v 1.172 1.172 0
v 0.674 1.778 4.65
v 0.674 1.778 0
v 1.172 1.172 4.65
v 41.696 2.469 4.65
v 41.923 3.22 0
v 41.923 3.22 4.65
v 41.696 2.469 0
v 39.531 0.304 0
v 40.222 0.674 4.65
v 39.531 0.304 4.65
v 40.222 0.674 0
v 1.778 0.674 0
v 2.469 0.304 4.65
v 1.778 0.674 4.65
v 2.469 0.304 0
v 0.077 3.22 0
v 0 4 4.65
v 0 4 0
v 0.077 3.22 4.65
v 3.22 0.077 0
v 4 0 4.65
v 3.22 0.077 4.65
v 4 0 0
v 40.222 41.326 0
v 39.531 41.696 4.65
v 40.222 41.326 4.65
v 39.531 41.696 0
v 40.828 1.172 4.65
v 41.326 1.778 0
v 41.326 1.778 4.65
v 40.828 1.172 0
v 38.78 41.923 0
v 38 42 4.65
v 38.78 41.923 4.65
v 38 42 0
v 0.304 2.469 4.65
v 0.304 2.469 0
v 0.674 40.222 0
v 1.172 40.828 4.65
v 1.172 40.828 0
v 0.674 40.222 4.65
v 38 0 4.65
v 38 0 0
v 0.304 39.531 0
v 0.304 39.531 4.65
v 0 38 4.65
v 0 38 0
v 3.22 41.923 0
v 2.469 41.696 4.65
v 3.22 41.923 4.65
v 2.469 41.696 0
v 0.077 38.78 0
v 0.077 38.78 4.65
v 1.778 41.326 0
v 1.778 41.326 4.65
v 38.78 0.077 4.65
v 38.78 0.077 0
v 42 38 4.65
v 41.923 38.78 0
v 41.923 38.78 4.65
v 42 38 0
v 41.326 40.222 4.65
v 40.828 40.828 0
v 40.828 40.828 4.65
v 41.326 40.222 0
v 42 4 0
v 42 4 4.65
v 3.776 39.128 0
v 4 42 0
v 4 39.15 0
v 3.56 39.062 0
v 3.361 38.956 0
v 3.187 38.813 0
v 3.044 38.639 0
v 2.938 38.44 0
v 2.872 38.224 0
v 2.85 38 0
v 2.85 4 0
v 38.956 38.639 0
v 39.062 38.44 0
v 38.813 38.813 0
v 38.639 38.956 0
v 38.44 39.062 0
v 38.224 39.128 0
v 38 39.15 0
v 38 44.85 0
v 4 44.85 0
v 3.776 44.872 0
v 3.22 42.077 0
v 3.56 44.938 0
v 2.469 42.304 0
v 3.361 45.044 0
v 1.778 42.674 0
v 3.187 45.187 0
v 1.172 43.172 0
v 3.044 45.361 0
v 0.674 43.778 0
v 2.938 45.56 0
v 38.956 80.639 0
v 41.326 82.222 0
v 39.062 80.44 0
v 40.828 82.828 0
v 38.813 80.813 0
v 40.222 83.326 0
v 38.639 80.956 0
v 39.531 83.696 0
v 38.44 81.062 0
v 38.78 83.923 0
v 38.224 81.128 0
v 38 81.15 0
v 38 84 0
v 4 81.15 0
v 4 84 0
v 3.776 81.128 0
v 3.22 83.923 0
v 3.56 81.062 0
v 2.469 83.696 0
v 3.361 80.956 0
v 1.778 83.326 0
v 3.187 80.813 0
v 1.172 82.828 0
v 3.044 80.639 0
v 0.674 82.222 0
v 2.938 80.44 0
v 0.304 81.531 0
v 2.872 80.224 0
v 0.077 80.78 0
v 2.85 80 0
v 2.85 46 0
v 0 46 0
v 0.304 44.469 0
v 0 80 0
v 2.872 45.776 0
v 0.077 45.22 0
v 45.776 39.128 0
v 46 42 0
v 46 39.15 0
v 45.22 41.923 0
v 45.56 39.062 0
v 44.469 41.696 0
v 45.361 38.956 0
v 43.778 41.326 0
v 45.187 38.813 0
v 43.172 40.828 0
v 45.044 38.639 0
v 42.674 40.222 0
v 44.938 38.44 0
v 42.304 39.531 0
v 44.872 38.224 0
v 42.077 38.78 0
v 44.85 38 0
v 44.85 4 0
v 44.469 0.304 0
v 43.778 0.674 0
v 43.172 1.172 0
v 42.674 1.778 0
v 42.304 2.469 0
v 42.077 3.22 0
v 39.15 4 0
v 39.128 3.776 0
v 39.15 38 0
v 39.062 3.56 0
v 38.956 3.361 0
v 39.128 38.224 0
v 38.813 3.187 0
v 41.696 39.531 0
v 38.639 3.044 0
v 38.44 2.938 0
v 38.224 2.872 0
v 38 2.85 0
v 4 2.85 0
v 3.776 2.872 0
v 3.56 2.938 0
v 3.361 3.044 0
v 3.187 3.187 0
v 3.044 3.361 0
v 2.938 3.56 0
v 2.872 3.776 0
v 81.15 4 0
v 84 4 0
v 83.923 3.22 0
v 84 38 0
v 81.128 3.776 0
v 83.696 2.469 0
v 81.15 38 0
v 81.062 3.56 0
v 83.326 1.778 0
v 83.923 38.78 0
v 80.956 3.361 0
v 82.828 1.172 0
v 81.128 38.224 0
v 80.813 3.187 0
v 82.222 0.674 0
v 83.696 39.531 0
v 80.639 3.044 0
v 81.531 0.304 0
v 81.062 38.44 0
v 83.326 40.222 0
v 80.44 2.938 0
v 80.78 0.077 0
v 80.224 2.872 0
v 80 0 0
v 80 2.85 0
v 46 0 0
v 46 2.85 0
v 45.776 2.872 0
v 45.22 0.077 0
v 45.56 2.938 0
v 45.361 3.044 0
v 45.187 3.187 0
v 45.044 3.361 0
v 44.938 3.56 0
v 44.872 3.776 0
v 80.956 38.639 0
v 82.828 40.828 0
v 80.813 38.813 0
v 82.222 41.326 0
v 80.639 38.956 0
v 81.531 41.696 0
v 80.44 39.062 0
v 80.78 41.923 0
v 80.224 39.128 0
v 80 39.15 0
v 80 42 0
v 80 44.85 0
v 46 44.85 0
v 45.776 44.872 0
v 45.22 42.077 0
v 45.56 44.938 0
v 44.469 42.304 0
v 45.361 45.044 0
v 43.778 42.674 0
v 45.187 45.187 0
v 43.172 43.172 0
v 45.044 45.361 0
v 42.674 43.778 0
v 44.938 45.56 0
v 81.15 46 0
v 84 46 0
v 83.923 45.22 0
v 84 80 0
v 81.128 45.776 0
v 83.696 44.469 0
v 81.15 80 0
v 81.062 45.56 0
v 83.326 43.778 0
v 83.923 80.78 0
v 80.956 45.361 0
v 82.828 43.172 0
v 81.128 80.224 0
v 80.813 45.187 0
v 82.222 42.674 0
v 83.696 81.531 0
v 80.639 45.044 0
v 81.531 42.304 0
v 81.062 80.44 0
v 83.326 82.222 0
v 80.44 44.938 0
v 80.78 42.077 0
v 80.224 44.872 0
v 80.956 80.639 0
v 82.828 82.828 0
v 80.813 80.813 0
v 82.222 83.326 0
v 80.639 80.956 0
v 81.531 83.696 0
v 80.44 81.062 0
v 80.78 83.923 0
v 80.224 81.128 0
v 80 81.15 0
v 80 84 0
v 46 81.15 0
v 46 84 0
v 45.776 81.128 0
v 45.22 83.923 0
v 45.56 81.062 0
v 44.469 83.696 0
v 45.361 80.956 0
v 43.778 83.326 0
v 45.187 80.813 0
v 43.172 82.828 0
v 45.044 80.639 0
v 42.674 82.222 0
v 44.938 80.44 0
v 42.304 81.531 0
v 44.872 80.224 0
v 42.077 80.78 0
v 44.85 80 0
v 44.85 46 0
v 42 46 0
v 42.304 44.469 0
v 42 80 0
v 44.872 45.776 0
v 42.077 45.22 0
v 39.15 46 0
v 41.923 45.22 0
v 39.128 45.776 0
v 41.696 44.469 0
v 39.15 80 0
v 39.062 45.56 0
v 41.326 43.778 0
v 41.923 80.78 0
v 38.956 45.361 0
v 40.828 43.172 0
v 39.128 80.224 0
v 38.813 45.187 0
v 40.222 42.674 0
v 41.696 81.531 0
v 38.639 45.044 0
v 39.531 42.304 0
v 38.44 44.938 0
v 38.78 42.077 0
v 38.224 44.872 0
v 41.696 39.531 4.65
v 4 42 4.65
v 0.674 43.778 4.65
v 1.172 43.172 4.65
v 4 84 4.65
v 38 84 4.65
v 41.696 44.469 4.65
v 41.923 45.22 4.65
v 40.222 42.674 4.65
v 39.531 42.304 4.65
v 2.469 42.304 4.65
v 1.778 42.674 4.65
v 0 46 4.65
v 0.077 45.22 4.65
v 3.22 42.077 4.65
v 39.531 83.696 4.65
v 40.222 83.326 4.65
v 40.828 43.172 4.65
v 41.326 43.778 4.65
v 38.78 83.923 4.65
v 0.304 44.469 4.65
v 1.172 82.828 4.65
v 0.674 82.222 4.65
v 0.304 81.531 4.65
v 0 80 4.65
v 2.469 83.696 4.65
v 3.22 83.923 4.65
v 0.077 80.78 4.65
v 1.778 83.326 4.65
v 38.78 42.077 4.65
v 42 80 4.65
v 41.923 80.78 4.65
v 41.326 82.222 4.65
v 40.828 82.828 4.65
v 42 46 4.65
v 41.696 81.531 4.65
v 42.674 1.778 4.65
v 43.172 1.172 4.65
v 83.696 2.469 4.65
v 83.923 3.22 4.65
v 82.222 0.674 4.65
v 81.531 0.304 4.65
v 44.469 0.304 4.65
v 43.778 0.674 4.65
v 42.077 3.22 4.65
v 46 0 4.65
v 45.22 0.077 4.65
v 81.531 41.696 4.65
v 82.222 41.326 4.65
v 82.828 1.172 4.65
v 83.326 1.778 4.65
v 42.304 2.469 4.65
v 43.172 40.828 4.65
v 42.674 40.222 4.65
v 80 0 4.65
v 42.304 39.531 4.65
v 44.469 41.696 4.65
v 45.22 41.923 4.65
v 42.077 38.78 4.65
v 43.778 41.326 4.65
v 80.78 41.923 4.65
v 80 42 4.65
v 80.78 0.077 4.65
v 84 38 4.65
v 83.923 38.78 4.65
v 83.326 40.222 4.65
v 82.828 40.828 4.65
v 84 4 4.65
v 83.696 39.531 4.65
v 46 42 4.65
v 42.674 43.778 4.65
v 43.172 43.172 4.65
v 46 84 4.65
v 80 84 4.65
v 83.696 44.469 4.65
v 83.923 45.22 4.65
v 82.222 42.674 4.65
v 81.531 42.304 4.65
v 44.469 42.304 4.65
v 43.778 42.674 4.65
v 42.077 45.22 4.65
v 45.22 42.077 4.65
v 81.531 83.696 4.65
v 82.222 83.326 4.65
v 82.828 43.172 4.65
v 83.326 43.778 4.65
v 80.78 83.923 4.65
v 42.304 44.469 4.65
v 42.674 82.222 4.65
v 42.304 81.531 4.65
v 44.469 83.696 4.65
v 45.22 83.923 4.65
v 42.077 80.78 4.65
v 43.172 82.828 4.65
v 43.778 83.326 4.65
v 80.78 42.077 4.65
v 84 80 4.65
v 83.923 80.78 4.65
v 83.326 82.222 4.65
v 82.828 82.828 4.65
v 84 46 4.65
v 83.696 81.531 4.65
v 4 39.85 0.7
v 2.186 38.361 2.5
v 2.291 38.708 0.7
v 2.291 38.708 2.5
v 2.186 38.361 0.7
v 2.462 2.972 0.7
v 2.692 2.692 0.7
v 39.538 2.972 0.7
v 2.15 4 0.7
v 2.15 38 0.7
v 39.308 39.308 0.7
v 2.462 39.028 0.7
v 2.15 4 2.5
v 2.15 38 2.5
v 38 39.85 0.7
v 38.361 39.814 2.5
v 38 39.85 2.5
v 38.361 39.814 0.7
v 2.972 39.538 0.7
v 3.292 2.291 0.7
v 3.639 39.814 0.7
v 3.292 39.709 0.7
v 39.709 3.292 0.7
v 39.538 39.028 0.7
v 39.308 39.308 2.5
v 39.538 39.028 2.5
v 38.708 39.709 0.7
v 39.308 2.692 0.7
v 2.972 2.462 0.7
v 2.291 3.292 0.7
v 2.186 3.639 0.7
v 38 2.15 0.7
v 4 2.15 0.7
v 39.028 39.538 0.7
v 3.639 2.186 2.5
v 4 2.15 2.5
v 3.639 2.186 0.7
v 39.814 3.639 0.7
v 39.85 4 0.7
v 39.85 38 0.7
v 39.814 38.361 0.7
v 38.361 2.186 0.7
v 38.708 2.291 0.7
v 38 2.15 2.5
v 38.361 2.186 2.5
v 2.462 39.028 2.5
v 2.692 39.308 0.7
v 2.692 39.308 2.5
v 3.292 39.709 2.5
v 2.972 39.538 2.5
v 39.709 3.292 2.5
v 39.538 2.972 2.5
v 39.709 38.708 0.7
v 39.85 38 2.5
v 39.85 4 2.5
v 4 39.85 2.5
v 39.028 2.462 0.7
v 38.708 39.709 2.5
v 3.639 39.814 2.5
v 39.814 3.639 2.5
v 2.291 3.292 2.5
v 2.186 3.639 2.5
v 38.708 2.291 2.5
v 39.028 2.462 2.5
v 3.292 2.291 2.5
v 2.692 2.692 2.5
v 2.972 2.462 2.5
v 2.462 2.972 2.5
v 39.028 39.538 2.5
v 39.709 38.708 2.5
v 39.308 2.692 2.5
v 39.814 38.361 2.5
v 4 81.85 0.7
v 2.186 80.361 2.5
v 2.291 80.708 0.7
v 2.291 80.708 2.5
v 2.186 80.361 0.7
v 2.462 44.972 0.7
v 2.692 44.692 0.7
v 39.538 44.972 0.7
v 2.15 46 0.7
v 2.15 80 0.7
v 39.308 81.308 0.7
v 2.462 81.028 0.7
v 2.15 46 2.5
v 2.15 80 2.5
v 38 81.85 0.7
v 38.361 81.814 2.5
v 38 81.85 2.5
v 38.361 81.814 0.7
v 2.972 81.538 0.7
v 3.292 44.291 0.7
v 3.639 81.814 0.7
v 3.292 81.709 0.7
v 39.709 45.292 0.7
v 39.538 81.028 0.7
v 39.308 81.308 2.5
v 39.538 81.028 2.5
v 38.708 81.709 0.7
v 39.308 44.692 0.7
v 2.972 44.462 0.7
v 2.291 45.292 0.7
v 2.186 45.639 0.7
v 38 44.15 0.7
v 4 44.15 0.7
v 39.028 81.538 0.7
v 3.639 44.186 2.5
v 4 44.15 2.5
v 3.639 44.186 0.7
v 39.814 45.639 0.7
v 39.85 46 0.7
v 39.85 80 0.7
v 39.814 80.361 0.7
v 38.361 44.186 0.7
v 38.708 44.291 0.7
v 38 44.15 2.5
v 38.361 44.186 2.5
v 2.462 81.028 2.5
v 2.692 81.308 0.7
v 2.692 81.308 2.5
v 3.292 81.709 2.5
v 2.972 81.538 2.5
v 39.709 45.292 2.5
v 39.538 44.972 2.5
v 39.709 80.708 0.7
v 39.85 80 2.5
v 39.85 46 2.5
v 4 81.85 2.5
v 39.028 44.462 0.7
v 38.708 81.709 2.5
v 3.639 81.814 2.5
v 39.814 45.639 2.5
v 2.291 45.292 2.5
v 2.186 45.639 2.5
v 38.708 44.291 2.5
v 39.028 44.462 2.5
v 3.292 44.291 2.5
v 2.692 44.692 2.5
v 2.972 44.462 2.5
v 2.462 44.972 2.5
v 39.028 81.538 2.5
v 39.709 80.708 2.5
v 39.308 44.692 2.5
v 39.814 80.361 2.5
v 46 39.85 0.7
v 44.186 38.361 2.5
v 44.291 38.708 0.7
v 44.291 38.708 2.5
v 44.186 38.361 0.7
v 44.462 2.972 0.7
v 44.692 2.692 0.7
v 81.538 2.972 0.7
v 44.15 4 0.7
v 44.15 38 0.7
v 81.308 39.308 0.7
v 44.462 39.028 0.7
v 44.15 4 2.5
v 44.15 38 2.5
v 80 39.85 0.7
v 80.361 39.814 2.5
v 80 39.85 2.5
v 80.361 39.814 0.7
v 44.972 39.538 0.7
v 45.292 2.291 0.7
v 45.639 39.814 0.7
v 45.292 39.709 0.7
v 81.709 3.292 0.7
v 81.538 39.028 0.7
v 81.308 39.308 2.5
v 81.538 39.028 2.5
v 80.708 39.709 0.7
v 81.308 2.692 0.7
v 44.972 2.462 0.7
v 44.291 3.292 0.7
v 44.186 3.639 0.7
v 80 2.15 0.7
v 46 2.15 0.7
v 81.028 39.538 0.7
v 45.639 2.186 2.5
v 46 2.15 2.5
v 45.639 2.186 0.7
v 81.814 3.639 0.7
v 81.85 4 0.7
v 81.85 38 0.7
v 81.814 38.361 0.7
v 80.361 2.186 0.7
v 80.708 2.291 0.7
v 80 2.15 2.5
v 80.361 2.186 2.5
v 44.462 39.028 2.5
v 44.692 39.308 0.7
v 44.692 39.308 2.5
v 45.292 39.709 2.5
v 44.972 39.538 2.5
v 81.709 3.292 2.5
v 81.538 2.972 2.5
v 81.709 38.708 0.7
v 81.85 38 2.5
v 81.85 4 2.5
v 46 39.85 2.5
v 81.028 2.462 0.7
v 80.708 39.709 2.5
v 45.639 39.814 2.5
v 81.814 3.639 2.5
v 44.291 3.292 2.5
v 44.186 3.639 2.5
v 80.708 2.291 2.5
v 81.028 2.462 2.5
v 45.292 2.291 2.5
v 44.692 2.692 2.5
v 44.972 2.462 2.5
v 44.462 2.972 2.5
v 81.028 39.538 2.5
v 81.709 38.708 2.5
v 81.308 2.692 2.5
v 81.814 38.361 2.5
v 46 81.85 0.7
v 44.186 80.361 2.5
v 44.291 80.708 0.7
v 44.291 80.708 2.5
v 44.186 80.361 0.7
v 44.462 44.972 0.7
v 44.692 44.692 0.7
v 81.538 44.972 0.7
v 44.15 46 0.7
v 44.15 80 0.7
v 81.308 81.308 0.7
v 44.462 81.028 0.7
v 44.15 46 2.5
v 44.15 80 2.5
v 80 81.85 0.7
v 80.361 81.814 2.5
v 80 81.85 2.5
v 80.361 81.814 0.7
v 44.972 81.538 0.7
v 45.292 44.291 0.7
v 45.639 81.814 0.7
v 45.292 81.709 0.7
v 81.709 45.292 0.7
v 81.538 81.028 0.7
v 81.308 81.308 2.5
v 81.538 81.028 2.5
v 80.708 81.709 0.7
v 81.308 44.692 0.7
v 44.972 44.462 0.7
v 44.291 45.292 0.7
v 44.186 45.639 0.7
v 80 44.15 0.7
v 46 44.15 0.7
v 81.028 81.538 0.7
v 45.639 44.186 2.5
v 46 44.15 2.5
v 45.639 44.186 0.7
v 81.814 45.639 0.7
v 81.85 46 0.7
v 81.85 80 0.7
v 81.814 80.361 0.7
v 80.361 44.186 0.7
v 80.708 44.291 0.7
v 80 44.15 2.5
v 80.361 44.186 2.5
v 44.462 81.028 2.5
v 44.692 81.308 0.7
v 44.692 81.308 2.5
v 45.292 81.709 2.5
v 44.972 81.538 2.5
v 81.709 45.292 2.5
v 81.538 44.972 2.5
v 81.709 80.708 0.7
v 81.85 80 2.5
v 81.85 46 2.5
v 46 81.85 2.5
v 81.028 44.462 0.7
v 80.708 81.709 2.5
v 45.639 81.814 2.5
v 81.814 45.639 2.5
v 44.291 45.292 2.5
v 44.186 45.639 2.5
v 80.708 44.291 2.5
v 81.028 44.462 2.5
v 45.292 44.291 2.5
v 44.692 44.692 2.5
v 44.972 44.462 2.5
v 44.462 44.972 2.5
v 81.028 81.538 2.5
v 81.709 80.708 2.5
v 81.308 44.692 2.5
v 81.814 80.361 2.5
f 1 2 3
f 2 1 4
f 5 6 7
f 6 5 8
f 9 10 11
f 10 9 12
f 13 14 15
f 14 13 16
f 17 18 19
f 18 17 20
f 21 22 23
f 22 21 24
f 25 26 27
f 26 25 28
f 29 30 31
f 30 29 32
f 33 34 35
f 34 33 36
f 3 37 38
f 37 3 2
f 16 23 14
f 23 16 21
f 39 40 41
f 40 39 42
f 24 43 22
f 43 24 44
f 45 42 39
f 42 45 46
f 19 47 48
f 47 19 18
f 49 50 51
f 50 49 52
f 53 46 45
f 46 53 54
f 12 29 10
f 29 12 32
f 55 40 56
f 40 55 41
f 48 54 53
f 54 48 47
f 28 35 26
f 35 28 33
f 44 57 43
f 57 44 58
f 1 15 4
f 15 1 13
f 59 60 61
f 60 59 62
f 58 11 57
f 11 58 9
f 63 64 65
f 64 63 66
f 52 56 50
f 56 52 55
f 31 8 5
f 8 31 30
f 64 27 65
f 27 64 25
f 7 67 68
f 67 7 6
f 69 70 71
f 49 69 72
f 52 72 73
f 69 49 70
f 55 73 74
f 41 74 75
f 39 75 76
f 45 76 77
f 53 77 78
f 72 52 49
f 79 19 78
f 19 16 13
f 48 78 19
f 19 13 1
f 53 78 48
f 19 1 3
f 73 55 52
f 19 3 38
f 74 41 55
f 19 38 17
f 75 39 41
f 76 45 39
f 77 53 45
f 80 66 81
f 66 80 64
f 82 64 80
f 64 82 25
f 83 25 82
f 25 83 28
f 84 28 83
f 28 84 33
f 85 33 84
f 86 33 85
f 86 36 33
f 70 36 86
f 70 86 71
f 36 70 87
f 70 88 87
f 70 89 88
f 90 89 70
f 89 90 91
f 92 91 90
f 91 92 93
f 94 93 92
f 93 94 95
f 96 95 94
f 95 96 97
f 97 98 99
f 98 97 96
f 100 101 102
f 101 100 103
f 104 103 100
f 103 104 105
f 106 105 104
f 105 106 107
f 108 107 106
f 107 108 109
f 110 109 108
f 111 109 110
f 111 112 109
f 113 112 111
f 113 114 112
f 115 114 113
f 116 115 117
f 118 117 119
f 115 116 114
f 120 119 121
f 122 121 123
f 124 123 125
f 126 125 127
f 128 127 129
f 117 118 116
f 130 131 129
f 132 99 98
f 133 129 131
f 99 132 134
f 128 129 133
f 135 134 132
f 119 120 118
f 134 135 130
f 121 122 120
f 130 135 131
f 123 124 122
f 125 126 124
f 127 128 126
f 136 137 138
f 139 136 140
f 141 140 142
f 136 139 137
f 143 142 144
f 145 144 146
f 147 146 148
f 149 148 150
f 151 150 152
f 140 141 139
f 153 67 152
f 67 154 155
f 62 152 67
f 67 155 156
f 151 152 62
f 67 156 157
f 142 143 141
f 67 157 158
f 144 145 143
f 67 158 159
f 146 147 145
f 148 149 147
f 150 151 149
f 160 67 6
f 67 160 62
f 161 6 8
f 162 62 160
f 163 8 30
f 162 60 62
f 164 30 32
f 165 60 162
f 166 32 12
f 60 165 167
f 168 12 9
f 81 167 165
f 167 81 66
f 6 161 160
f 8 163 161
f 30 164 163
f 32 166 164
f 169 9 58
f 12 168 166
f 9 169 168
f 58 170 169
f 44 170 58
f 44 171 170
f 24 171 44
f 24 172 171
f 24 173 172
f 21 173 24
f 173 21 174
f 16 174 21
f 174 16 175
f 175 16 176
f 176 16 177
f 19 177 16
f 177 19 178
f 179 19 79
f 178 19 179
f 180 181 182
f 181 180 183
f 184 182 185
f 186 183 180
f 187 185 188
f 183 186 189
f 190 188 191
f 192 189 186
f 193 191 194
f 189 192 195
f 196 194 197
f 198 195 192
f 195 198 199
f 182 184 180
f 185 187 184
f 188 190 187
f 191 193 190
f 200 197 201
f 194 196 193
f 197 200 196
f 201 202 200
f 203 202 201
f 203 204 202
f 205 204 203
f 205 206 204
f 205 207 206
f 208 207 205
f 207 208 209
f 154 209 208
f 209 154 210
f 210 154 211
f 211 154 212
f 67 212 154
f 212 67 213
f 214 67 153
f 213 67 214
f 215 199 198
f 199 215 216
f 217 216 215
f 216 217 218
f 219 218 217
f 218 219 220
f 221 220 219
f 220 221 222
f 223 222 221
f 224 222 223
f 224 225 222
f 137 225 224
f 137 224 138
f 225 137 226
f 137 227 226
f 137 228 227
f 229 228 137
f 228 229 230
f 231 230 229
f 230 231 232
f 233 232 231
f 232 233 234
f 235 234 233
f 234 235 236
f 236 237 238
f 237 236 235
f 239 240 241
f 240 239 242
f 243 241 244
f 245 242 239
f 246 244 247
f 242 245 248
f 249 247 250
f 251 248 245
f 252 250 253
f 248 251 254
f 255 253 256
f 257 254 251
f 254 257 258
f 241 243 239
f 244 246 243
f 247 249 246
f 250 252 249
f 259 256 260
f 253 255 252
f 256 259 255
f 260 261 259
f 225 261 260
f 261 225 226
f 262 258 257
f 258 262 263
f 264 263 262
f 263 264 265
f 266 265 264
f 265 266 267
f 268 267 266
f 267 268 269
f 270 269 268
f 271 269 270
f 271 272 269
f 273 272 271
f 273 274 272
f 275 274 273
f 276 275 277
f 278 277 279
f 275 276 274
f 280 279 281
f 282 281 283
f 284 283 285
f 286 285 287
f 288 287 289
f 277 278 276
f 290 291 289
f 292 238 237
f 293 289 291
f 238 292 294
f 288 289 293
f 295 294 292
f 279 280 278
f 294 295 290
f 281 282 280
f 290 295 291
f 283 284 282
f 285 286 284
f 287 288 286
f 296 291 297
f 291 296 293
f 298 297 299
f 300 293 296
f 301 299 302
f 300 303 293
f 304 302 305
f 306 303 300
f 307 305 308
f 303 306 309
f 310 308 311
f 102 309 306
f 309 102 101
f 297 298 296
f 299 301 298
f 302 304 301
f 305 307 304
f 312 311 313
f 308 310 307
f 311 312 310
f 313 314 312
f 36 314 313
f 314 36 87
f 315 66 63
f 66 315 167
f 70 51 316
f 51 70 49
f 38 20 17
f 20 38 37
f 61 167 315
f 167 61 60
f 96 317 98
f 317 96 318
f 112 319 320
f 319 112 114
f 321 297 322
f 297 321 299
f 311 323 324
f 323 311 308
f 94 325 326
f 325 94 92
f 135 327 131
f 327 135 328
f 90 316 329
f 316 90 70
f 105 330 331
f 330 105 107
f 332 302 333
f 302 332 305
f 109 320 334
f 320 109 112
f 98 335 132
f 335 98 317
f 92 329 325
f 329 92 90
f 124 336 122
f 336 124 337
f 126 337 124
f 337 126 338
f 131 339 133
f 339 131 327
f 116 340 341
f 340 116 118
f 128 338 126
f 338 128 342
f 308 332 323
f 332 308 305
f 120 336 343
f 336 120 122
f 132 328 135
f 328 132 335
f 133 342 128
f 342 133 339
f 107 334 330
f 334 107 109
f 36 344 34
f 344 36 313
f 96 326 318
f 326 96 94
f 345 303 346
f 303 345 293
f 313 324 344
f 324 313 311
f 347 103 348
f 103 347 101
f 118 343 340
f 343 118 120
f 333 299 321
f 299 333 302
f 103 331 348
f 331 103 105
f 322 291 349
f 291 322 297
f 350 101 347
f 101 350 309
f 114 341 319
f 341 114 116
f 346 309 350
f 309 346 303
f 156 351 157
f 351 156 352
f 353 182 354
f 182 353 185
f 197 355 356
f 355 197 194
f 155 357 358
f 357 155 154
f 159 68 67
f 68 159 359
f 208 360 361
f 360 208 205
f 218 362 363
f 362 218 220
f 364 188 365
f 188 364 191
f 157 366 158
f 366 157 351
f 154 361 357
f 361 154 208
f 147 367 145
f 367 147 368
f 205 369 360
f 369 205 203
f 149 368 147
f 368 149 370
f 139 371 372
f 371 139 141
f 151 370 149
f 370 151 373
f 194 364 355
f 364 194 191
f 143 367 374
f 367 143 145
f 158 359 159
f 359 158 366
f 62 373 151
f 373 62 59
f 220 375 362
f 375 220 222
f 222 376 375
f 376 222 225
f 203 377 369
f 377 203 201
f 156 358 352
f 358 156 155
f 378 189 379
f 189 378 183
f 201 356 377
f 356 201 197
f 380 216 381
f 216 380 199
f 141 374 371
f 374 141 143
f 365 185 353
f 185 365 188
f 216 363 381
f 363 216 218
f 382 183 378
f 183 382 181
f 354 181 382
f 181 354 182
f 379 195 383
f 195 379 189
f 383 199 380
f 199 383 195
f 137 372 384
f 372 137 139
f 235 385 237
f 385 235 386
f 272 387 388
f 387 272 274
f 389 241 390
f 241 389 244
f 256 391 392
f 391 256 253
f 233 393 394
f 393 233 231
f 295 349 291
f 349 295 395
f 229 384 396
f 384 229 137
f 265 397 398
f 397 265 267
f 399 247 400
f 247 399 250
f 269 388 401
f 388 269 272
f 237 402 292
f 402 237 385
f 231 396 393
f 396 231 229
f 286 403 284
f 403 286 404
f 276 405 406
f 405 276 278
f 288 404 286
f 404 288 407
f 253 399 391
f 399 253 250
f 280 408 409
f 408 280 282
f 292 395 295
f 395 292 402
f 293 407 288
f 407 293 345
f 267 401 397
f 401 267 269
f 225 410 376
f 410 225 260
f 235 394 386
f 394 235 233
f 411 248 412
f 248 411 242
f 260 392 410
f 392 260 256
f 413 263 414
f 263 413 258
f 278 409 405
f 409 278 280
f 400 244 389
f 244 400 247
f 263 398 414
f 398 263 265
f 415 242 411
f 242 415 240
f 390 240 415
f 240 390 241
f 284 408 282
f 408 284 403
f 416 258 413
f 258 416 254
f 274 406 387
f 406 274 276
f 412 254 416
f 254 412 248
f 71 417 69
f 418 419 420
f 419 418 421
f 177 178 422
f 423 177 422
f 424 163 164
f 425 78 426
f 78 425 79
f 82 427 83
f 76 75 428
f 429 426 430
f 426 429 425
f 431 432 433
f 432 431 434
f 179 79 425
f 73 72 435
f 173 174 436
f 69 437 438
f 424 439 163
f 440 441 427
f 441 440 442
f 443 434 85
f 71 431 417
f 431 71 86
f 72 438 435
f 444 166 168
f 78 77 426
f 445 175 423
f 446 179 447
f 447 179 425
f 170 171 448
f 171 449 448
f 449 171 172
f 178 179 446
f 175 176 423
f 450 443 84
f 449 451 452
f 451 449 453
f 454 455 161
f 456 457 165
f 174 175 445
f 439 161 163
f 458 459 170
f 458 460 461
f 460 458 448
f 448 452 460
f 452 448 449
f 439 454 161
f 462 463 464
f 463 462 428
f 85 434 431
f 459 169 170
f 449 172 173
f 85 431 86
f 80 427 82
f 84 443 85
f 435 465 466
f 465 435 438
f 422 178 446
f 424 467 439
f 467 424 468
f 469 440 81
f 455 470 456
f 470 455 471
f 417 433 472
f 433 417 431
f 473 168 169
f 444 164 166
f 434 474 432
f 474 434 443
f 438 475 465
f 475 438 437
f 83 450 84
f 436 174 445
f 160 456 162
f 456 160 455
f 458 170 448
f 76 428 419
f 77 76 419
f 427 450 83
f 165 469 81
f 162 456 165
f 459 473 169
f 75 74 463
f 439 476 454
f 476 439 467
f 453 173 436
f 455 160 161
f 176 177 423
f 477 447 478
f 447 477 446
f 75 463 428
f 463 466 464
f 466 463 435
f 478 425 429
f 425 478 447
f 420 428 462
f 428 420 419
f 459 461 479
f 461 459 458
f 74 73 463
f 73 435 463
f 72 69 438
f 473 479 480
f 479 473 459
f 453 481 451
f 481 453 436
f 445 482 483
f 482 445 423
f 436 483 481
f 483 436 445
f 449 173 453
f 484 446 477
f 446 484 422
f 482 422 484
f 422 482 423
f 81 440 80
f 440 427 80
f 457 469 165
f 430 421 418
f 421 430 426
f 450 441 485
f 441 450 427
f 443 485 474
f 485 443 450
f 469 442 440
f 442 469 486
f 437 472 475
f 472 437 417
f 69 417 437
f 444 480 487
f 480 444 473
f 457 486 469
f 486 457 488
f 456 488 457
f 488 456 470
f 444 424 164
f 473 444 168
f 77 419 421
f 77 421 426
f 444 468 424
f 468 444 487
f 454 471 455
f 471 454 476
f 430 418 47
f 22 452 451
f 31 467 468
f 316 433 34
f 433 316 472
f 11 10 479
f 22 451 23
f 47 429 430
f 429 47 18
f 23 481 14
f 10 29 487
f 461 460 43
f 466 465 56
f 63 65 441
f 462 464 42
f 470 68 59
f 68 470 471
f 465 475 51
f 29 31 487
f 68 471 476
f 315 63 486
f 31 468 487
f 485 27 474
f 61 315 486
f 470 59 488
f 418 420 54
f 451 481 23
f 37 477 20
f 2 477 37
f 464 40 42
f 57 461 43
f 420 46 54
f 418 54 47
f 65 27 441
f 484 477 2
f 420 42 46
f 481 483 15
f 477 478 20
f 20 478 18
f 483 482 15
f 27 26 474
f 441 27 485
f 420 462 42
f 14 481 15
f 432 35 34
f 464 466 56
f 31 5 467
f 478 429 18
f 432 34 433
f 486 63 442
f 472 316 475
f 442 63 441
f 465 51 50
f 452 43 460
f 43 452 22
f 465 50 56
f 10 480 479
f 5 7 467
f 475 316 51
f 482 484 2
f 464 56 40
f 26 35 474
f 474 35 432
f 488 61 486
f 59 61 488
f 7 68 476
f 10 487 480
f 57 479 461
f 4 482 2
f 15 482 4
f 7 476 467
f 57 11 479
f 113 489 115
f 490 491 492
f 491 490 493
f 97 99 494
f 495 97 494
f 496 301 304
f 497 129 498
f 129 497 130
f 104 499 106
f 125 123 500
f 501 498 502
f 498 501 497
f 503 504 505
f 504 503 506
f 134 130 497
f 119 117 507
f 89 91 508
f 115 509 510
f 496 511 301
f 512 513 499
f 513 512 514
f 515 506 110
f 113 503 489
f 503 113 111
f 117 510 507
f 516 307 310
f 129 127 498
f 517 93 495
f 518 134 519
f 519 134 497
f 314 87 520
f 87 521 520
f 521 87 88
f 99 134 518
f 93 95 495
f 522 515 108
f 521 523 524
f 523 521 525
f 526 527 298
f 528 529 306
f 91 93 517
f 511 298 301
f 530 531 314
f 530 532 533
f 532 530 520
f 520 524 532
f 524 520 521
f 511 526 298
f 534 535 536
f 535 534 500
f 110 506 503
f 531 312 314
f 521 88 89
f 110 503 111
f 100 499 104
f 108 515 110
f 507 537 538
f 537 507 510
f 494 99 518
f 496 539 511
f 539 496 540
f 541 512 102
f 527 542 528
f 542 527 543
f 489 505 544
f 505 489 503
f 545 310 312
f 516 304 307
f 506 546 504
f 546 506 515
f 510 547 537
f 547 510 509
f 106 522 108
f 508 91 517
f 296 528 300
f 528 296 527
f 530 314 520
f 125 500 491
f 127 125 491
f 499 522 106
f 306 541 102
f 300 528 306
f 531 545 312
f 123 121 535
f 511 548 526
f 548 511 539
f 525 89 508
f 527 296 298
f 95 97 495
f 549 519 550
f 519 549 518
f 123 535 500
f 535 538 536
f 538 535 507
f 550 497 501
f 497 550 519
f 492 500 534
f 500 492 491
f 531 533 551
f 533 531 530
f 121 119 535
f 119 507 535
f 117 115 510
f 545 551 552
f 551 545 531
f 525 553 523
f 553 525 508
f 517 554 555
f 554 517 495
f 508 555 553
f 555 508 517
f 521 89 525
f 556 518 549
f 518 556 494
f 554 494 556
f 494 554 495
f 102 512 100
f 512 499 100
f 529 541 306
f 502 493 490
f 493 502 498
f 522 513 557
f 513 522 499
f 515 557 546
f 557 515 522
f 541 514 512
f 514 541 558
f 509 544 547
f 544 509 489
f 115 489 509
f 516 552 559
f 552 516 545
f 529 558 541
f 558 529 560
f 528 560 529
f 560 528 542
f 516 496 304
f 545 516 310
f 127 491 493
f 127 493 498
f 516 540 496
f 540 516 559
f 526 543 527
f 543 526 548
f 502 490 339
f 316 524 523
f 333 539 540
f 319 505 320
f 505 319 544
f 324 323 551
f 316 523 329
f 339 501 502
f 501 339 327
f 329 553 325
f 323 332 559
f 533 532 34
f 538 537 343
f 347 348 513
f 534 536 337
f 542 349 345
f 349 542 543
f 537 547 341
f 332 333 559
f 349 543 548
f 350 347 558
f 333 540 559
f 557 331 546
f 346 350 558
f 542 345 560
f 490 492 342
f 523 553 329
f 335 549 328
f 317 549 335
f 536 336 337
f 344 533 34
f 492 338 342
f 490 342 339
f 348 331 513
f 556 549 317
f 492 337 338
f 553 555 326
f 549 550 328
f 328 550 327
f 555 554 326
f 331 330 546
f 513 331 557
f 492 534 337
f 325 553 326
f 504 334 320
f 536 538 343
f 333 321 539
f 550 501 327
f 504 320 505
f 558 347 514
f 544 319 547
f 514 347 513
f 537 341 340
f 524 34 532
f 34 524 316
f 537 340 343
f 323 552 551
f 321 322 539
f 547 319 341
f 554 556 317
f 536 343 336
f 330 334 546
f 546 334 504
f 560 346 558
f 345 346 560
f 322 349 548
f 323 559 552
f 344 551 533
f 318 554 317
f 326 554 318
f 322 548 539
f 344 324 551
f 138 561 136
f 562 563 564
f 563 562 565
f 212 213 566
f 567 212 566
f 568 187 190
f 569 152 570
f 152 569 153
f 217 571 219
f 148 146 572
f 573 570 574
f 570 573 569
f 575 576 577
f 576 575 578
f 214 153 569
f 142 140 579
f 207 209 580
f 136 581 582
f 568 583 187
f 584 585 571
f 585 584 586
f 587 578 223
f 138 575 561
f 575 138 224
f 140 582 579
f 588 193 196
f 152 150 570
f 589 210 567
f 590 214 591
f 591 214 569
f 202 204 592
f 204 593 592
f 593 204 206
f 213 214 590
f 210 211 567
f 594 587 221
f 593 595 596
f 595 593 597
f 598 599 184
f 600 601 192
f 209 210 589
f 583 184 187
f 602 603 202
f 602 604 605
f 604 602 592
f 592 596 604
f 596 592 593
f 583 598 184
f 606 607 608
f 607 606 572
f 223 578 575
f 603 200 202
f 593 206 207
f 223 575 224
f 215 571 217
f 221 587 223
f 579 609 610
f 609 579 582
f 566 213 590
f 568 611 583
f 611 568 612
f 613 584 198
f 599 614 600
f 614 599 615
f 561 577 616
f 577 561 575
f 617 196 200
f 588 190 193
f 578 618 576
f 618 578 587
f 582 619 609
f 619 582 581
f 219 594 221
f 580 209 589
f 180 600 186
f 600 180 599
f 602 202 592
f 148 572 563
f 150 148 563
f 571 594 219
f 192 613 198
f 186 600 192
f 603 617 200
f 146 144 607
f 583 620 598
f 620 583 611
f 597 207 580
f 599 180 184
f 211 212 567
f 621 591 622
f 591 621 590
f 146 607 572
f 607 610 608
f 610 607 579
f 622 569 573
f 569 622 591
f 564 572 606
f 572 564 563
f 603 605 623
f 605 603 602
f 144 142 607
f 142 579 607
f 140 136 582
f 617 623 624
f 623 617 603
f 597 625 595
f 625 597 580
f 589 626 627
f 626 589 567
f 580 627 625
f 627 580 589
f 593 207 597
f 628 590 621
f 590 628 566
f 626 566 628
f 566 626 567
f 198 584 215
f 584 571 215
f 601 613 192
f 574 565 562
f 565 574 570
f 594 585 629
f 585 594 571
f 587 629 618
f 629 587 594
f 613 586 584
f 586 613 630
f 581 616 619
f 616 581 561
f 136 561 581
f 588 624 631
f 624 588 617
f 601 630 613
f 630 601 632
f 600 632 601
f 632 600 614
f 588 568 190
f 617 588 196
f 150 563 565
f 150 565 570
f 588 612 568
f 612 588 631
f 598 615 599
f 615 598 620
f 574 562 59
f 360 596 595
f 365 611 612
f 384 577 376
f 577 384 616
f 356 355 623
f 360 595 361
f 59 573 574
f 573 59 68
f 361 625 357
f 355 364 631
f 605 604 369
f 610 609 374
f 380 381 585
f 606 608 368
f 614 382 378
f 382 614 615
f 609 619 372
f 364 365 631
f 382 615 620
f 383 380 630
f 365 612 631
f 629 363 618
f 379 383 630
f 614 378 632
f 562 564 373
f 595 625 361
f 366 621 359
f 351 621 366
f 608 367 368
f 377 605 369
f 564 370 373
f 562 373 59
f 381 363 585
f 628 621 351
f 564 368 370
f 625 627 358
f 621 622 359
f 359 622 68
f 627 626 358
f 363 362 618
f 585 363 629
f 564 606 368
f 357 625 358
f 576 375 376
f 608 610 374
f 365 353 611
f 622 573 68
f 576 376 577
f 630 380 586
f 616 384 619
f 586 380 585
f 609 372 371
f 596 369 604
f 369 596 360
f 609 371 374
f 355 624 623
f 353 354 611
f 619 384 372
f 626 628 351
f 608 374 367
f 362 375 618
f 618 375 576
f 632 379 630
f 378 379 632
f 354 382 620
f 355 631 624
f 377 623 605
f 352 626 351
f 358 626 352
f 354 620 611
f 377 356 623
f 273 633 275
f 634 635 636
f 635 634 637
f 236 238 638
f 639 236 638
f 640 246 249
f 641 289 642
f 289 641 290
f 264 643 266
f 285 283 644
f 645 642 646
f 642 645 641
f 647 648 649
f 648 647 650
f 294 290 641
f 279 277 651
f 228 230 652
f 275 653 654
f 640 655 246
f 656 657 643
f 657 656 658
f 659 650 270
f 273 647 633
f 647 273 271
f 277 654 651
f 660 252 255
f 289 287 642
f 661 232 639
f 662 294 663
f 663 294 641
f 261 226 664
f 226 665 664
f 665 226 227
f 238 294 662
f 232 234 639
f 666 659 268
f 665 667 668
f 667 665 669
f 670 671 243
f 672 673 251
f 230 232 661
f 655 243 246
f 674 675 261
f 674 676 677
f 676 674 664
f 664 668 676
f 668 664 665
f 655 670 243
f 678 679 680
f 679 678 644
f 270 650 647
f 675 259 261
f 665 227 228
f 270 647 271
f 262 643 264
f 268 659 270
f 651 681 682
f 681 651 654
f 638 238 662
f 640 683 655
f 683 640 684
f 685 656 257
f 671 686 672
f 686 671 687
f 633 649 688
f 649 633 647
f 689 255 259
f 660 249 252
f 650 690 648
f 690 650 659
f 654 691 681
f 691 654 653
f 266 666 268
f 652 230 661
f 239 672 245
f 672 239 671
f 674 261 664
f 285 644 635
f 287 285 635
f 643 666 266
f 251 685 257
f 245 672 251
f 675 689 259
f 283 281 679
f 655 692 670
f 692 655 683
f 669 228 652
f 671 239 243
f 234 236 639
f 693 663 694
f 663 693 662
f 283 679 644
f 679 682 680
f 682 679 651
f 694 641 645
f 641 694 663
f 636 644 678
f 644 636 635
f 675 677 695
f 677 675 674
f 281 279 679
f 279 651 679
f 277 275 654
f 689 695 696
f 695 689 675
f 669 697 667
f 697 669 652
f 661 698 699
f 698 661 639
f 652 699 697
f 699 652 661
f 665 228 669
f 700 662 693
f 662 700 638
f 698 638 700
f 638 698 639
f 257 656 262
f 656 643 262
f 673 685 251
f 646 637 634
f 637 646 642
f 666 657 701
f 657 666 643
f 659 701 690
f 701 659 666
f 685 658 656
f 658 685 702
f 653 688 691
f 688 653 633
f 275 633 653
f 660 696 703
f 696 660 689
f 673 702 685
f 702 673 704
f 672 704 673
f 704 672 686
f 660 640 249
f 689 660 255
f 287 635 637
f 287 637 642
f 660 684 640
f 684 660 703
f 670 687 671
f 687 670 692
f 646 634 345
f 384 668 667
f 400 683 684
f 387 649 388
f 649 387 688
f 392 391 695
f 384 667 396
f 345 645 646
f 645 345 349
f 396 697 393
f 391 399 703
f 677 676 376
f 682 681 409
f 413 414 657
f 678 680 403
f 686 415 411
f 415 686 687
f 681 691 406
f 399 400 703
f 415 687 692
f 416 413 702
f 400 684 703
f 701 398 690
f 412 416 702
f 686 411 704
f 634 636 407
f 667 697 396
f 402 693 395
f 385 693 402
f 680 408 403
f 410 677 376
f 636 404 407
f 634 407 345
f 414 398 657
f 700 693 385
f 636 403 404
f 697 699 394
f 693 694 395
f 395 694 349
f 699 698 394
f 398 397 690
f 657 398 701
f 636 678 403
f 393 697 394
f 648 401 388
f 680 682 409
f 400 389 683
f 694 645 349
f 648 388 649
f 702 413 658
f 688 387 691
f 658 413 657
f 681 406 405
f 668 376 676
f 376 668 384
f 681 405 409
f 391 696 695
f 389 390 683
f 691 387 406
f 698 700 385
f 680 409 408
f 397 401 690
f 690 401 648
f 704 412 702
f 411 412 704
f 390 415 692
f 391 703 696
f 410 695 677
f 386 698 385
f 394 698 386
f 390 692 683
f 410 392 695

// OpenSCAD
// file: ../gridfinity_core.scad
// ============================================================================
// Gridfinity Core Geometry Engine
// ============================================================================
// Standard constants, modules, and calculations derived strictly from:
//   - Official Gridfinity Specification v5: https://gridfinity.xyz/specification/
//   - Paul Bone's gfthings: https://github.com/PaulBone/gfthings
//
// Key standards:
//   - Pitch: 42.0 mm center-to-center
//   - Tolerance: 0.25 mm clearance per side (0.5 mm total)
//   - Socket Mouth: 42.0 mm (r = 4.0 mm)
//   - Top Chamfer: 2.15 mm @ 45°
//   - Vertical Waist: 1.80 mm @ 37.7 mm width (r = 1.85 mm)
//   - Bottom Chamfer / Ledge: 0.70 mm @ 45° down to 36.3 mm (r = 1.15 mm)
//   - Socket Depth: 4.65 mm (leaves 0.1 mm clearance relief below 4.75 mm bin foot)
//   - Hole Spacing: 26.0 mm square (13.0 mm from cell center)
// ============================================================================

$fn = 32;

// ---- Grid Pitch & Tolerance ----
GF_PITCH            = 42.0;   // Standard cell spacing (mm)
GF_TOLERANCE        = 0.25;   // Clearance per side (mm)

// ---- Bin Foot Dimensions (Reference) ----
GF_BIN_TOP_W        = 41.50;  // 42.0 - 2 * 0.25
GF_BIN_WAIST_W      = 37.20;  // 41.5 - 2 * 2.15
GF_BIN_BOT_W        = 35.60;  // 37.2 - 2 * 0.80
GF_BIN_TOP_CHAMFER  = 2.15;
GF_BIN_VERT_WAIST   = 1.80;
GF_BIN_BOT_CHAMFER  = 0.80;
GF_BIN_PROFILE_H    = 4.75;   // 2.15 + 1.80 + 0.80
GF_BIN_TOP_R        = 3.75;   // 7.5mm dia
GF_BIN_WAIST_R      = 1.60;   // 3.75 - 2.15
GF_BIN_BOT_R        = 0.80;   // 1.60 - 0.80

// ---- Baseplate Socket Dimensions (+0.25mm Clearance Offset) ----
GF_SOCKET_TOP_W     = 42.00;  // Top mouth opening (mm)
GF_SOCKET_WAIST_W   = 37.70;  // 37.2 + 2 * 0.25 (mm)
GF_SOCKET_BOT_W     = 36.30;  // 37.7 - 2 * 0.70 (mm)

GF_TOP_CHAMFER_H    = 2.15;   // Top lead-in chamfer height (mm)
GF_VERT_WAIST_H     = 1.80;   // Straight vertical waist height (mm)
GF_BOT_CHAMFER_H    = 0.70;   // Bottom seating chamfer height (mm)
GF_PROFILE_H        = GF_TOP_CHAMFER_H + GF_VERT_WAIST_H + GF_BOT_CHAMFER_H; // 4.65 mm

// Corner Radii (Concentric with 4.0mm outer envelope)
GF_SOCKET_TOP_R     = 4.00;   // 8.0mm dia
GF_SOCKET_WAIST_R   = GF_SOCKET_TOP_R - GF_TOP_CHAMFER_H; // 1.85 mm (3.7mm dia)
GF_SOCKET_BOT_R     = GF_SOCKET_WAIST_R - GF_BOT_CHAMFER_H; // 1.15 mm (2.3mm dia)

// ---- Mounting Holes (Magnets & Screws) ----
GF_HOLE_OFFSET      = 13.0;   // Offset from cell center along X & Y (mm)
GF_HOLE_SPACING     = 26.0;   // Center-to-center hole distance (mm)
GF_MAGNET_D         = 6.2;    // Magnet hole diameter (mm, press fit for 6.0mm)
GF_MAGNET_H         = 2.2;    // Magnet hole depth (mm)
GF_SCREW_D          = 3.2;    // Screw hole diameter (mm, clearance for M3)

// ---- Geometry Helper Modules ----

// Centered rounded rectangle extruded to height h
module gf_rounded_rect(w, d, h, r=4) {
    eff_r = min(r, w/2 - 0.01, d/2 - 0.01);
    if (eff_r > 0.01) {
        hull() {
            for (x = [-w/2 + eff_r, w/2 - eff_r]) {
                for (y = [-d/2 + eff_r, d/2 - eff_r]) {
                    translate([x, y, 0])
                        cylinder(r=eff_r, h=h);
                }
            }
        }
    } else {
        translate([-w/2, -d/2, 0])
            cube([w, d, h]);
    }
}

// Subtractive pocket socket conforming strictly to gridfinity.xyz v5
module gf_socket_pocket(open_bottom=true, chamfer_ledge=true, clearance=0, extra_top=1.0) {
    top_w   = GF_SOCKET_TOP_W + 2 * clearance;
    waist_w = GF_SOCKET_WAIST_W + 2 * clearance;
    bot_w   = GF_SOCKET_BOT_W + 2 * clearance;
    
    top_r   = max(0.1, GF_SOCKET_TOP_R + clearance);
    waist_r = max(0.1, GF_SOCKET_WAIST_R + clearance);
    bot_r   = max(0.1, GF_SOCKET_BOT_R + clearance);
    
    z_bot = 0;
    z_waist_bot = GF_BOT_CHAMFER_H;
    z_waist_top = GF_BOT_CHAMFER_H + GF_VERT_WAIST_H;
    z_top = GF_PROFILE_H;
    
    // Layer 3: Top 45° Chamfer (from waist_w up to top_w)
    hull() {
        translate([0, 0, z_waist_top])
            gf_rounded_rect(waist_w, waist_w, 0.01, r=waist_r);
        translate([0, 0, z_top])
            gf_rounded_rect(top_w, top_w, 0.01, r=top_r);
    }
    
    // Extra top extension for clean difference cut through top surface
    if (extra_top > 0) {
        translate([0, 0, z_top])
            gf_rounded_rect(top_w, top_w, extra_top, r=top_r);
    }
    
    // Layer 2: Straight vertical waist
    translate([0, 0, z_waist_bot])
        gf_rounded_rect(waist_w, waist_w, GF_VERT_WAIST_H + 0.01, r=waist_r);
    
    // Layer 1: Bottom chamfer / ledge
    if (chamfer_ledge) {
        hull() {
            translate([0, 0, z_bot])
                gf_rounded_rect(bot_w, bot_w, 0.01, r=bot_r);
            translate([0, 0, z_waist_bot])
                gf_rounded_rect(waist_w, waist_w, 0.01, r=waist_r);
        }
        // If bottom is open (Style 0 Ultralight), through-cut the center hole down past Z=0
        if (open_bottom) {
            translate([0, 0, -2])
                gf_rounded_rect(bot_w, bot_w, 2.01, r=bot_r);
        }
    } else {
        // If chamfer_ledge is false, cut the waist width straight to bottom
        translate([0, 0, open_bottom ? -2 : 0])
            gf_rounded_rect(waist_w, waist_w, (open_bottom ? 2 : 0) + z_waist_bot + 0.01, r=waist_r);
    }
}

// Positive cell outer envelope (standard 42x42 with r=4.0 corners)
module gf_cell_envelope(w=GF_PITCH, d=GF_PITCH, h=GF_PROFILE_H) {
    gf_rounded_rect(w, d, h, r=min(GF_SOCKET_TOP_R, w/2, d/2));
}

// Corner magnet and screw holes per cell (0, 2 diagonal, or 4 corners)
module gf_corner_holes(count=0, magnet_d=GF_MAGNET_D, magnet_h=GF_MAGNET_H, screw_d=GF_SCREW_D, h=GF_PROFILE_H) {
    if (count == 2) {
        // 2 holes at opposite diagonal corners (matching gfthings default)
        _gf_single_corner_hole(-GF_HOLE_OFFSET, -GF_HOLE_OFFSET, magnet_d, magnet_h, screw_d, h);
        _gf_single_corner_hole( GF_HOLE_OFFSET,  GF_HOLE_OFFSET, magnet_d, magnet_h, screw_d, h);
    } else if (count >= 4) {
        // 4 holes in all 4 corners
        for (sx = [-1, 1]) {
            for (sy = [-1, 1]) {
                _gf_single_corner_hole(sx * GF_HOLE_OFFSET, sy * GF_HOLE_OFFSET, magnet_d, magnet_h, screw_d, h);
            }
        }
    }
}

// Helper for a single corner hole (magnet counterbore from bottom + through screw hole)
module _gf_single_corner_hole(x, y, magnet_d, magnet_h, screw_d, h) {
    translate([x, y, 0]) {
        if (magnet_d > 0 && magnet_h > 0) {
            translate([0, 0, -0.01])
                cylinder(d=magnet_d, h=magnet_h + 0.01, $fn=30);
        }
        if (screw_d > 0) {
            translate([0, 0, -1])
                cylinder(d=screw_d, h=h + 2, $fn=24);
        }
    }
}

// Trapezoidal edge cutout along cell walls (inspired by gfthings EdgeCut)
module gf_edge_cut(cut_len=26.0, cut_h=GF_PROFILE_H) {
    tri_w = tan(30) * cut_h;
    short_len = max(0.1, cut_len - 2 * tri_w);
    hull() {
        translate([-short_len/2, -1, 0]) cube([short_len, 2, cut_h]);
        translate([-cut_len/2, -1, cut_h]) cube([cut_len, 2, 0.01]);
    }
}
// main file
// Test script for Ultralight_Gridfinity.scad
_override_use_auto_fit = false;
_override_manual_grid_x = 2;
_override_manual_grid_y = 2;
_override_clearance = 0;
_override_tiling_mode = false;
_override_style = 0;
_override_chamfer_ledge = true;
_override_corner_holes = 4;

include <../Ultralight_Gridfinity.scad>
